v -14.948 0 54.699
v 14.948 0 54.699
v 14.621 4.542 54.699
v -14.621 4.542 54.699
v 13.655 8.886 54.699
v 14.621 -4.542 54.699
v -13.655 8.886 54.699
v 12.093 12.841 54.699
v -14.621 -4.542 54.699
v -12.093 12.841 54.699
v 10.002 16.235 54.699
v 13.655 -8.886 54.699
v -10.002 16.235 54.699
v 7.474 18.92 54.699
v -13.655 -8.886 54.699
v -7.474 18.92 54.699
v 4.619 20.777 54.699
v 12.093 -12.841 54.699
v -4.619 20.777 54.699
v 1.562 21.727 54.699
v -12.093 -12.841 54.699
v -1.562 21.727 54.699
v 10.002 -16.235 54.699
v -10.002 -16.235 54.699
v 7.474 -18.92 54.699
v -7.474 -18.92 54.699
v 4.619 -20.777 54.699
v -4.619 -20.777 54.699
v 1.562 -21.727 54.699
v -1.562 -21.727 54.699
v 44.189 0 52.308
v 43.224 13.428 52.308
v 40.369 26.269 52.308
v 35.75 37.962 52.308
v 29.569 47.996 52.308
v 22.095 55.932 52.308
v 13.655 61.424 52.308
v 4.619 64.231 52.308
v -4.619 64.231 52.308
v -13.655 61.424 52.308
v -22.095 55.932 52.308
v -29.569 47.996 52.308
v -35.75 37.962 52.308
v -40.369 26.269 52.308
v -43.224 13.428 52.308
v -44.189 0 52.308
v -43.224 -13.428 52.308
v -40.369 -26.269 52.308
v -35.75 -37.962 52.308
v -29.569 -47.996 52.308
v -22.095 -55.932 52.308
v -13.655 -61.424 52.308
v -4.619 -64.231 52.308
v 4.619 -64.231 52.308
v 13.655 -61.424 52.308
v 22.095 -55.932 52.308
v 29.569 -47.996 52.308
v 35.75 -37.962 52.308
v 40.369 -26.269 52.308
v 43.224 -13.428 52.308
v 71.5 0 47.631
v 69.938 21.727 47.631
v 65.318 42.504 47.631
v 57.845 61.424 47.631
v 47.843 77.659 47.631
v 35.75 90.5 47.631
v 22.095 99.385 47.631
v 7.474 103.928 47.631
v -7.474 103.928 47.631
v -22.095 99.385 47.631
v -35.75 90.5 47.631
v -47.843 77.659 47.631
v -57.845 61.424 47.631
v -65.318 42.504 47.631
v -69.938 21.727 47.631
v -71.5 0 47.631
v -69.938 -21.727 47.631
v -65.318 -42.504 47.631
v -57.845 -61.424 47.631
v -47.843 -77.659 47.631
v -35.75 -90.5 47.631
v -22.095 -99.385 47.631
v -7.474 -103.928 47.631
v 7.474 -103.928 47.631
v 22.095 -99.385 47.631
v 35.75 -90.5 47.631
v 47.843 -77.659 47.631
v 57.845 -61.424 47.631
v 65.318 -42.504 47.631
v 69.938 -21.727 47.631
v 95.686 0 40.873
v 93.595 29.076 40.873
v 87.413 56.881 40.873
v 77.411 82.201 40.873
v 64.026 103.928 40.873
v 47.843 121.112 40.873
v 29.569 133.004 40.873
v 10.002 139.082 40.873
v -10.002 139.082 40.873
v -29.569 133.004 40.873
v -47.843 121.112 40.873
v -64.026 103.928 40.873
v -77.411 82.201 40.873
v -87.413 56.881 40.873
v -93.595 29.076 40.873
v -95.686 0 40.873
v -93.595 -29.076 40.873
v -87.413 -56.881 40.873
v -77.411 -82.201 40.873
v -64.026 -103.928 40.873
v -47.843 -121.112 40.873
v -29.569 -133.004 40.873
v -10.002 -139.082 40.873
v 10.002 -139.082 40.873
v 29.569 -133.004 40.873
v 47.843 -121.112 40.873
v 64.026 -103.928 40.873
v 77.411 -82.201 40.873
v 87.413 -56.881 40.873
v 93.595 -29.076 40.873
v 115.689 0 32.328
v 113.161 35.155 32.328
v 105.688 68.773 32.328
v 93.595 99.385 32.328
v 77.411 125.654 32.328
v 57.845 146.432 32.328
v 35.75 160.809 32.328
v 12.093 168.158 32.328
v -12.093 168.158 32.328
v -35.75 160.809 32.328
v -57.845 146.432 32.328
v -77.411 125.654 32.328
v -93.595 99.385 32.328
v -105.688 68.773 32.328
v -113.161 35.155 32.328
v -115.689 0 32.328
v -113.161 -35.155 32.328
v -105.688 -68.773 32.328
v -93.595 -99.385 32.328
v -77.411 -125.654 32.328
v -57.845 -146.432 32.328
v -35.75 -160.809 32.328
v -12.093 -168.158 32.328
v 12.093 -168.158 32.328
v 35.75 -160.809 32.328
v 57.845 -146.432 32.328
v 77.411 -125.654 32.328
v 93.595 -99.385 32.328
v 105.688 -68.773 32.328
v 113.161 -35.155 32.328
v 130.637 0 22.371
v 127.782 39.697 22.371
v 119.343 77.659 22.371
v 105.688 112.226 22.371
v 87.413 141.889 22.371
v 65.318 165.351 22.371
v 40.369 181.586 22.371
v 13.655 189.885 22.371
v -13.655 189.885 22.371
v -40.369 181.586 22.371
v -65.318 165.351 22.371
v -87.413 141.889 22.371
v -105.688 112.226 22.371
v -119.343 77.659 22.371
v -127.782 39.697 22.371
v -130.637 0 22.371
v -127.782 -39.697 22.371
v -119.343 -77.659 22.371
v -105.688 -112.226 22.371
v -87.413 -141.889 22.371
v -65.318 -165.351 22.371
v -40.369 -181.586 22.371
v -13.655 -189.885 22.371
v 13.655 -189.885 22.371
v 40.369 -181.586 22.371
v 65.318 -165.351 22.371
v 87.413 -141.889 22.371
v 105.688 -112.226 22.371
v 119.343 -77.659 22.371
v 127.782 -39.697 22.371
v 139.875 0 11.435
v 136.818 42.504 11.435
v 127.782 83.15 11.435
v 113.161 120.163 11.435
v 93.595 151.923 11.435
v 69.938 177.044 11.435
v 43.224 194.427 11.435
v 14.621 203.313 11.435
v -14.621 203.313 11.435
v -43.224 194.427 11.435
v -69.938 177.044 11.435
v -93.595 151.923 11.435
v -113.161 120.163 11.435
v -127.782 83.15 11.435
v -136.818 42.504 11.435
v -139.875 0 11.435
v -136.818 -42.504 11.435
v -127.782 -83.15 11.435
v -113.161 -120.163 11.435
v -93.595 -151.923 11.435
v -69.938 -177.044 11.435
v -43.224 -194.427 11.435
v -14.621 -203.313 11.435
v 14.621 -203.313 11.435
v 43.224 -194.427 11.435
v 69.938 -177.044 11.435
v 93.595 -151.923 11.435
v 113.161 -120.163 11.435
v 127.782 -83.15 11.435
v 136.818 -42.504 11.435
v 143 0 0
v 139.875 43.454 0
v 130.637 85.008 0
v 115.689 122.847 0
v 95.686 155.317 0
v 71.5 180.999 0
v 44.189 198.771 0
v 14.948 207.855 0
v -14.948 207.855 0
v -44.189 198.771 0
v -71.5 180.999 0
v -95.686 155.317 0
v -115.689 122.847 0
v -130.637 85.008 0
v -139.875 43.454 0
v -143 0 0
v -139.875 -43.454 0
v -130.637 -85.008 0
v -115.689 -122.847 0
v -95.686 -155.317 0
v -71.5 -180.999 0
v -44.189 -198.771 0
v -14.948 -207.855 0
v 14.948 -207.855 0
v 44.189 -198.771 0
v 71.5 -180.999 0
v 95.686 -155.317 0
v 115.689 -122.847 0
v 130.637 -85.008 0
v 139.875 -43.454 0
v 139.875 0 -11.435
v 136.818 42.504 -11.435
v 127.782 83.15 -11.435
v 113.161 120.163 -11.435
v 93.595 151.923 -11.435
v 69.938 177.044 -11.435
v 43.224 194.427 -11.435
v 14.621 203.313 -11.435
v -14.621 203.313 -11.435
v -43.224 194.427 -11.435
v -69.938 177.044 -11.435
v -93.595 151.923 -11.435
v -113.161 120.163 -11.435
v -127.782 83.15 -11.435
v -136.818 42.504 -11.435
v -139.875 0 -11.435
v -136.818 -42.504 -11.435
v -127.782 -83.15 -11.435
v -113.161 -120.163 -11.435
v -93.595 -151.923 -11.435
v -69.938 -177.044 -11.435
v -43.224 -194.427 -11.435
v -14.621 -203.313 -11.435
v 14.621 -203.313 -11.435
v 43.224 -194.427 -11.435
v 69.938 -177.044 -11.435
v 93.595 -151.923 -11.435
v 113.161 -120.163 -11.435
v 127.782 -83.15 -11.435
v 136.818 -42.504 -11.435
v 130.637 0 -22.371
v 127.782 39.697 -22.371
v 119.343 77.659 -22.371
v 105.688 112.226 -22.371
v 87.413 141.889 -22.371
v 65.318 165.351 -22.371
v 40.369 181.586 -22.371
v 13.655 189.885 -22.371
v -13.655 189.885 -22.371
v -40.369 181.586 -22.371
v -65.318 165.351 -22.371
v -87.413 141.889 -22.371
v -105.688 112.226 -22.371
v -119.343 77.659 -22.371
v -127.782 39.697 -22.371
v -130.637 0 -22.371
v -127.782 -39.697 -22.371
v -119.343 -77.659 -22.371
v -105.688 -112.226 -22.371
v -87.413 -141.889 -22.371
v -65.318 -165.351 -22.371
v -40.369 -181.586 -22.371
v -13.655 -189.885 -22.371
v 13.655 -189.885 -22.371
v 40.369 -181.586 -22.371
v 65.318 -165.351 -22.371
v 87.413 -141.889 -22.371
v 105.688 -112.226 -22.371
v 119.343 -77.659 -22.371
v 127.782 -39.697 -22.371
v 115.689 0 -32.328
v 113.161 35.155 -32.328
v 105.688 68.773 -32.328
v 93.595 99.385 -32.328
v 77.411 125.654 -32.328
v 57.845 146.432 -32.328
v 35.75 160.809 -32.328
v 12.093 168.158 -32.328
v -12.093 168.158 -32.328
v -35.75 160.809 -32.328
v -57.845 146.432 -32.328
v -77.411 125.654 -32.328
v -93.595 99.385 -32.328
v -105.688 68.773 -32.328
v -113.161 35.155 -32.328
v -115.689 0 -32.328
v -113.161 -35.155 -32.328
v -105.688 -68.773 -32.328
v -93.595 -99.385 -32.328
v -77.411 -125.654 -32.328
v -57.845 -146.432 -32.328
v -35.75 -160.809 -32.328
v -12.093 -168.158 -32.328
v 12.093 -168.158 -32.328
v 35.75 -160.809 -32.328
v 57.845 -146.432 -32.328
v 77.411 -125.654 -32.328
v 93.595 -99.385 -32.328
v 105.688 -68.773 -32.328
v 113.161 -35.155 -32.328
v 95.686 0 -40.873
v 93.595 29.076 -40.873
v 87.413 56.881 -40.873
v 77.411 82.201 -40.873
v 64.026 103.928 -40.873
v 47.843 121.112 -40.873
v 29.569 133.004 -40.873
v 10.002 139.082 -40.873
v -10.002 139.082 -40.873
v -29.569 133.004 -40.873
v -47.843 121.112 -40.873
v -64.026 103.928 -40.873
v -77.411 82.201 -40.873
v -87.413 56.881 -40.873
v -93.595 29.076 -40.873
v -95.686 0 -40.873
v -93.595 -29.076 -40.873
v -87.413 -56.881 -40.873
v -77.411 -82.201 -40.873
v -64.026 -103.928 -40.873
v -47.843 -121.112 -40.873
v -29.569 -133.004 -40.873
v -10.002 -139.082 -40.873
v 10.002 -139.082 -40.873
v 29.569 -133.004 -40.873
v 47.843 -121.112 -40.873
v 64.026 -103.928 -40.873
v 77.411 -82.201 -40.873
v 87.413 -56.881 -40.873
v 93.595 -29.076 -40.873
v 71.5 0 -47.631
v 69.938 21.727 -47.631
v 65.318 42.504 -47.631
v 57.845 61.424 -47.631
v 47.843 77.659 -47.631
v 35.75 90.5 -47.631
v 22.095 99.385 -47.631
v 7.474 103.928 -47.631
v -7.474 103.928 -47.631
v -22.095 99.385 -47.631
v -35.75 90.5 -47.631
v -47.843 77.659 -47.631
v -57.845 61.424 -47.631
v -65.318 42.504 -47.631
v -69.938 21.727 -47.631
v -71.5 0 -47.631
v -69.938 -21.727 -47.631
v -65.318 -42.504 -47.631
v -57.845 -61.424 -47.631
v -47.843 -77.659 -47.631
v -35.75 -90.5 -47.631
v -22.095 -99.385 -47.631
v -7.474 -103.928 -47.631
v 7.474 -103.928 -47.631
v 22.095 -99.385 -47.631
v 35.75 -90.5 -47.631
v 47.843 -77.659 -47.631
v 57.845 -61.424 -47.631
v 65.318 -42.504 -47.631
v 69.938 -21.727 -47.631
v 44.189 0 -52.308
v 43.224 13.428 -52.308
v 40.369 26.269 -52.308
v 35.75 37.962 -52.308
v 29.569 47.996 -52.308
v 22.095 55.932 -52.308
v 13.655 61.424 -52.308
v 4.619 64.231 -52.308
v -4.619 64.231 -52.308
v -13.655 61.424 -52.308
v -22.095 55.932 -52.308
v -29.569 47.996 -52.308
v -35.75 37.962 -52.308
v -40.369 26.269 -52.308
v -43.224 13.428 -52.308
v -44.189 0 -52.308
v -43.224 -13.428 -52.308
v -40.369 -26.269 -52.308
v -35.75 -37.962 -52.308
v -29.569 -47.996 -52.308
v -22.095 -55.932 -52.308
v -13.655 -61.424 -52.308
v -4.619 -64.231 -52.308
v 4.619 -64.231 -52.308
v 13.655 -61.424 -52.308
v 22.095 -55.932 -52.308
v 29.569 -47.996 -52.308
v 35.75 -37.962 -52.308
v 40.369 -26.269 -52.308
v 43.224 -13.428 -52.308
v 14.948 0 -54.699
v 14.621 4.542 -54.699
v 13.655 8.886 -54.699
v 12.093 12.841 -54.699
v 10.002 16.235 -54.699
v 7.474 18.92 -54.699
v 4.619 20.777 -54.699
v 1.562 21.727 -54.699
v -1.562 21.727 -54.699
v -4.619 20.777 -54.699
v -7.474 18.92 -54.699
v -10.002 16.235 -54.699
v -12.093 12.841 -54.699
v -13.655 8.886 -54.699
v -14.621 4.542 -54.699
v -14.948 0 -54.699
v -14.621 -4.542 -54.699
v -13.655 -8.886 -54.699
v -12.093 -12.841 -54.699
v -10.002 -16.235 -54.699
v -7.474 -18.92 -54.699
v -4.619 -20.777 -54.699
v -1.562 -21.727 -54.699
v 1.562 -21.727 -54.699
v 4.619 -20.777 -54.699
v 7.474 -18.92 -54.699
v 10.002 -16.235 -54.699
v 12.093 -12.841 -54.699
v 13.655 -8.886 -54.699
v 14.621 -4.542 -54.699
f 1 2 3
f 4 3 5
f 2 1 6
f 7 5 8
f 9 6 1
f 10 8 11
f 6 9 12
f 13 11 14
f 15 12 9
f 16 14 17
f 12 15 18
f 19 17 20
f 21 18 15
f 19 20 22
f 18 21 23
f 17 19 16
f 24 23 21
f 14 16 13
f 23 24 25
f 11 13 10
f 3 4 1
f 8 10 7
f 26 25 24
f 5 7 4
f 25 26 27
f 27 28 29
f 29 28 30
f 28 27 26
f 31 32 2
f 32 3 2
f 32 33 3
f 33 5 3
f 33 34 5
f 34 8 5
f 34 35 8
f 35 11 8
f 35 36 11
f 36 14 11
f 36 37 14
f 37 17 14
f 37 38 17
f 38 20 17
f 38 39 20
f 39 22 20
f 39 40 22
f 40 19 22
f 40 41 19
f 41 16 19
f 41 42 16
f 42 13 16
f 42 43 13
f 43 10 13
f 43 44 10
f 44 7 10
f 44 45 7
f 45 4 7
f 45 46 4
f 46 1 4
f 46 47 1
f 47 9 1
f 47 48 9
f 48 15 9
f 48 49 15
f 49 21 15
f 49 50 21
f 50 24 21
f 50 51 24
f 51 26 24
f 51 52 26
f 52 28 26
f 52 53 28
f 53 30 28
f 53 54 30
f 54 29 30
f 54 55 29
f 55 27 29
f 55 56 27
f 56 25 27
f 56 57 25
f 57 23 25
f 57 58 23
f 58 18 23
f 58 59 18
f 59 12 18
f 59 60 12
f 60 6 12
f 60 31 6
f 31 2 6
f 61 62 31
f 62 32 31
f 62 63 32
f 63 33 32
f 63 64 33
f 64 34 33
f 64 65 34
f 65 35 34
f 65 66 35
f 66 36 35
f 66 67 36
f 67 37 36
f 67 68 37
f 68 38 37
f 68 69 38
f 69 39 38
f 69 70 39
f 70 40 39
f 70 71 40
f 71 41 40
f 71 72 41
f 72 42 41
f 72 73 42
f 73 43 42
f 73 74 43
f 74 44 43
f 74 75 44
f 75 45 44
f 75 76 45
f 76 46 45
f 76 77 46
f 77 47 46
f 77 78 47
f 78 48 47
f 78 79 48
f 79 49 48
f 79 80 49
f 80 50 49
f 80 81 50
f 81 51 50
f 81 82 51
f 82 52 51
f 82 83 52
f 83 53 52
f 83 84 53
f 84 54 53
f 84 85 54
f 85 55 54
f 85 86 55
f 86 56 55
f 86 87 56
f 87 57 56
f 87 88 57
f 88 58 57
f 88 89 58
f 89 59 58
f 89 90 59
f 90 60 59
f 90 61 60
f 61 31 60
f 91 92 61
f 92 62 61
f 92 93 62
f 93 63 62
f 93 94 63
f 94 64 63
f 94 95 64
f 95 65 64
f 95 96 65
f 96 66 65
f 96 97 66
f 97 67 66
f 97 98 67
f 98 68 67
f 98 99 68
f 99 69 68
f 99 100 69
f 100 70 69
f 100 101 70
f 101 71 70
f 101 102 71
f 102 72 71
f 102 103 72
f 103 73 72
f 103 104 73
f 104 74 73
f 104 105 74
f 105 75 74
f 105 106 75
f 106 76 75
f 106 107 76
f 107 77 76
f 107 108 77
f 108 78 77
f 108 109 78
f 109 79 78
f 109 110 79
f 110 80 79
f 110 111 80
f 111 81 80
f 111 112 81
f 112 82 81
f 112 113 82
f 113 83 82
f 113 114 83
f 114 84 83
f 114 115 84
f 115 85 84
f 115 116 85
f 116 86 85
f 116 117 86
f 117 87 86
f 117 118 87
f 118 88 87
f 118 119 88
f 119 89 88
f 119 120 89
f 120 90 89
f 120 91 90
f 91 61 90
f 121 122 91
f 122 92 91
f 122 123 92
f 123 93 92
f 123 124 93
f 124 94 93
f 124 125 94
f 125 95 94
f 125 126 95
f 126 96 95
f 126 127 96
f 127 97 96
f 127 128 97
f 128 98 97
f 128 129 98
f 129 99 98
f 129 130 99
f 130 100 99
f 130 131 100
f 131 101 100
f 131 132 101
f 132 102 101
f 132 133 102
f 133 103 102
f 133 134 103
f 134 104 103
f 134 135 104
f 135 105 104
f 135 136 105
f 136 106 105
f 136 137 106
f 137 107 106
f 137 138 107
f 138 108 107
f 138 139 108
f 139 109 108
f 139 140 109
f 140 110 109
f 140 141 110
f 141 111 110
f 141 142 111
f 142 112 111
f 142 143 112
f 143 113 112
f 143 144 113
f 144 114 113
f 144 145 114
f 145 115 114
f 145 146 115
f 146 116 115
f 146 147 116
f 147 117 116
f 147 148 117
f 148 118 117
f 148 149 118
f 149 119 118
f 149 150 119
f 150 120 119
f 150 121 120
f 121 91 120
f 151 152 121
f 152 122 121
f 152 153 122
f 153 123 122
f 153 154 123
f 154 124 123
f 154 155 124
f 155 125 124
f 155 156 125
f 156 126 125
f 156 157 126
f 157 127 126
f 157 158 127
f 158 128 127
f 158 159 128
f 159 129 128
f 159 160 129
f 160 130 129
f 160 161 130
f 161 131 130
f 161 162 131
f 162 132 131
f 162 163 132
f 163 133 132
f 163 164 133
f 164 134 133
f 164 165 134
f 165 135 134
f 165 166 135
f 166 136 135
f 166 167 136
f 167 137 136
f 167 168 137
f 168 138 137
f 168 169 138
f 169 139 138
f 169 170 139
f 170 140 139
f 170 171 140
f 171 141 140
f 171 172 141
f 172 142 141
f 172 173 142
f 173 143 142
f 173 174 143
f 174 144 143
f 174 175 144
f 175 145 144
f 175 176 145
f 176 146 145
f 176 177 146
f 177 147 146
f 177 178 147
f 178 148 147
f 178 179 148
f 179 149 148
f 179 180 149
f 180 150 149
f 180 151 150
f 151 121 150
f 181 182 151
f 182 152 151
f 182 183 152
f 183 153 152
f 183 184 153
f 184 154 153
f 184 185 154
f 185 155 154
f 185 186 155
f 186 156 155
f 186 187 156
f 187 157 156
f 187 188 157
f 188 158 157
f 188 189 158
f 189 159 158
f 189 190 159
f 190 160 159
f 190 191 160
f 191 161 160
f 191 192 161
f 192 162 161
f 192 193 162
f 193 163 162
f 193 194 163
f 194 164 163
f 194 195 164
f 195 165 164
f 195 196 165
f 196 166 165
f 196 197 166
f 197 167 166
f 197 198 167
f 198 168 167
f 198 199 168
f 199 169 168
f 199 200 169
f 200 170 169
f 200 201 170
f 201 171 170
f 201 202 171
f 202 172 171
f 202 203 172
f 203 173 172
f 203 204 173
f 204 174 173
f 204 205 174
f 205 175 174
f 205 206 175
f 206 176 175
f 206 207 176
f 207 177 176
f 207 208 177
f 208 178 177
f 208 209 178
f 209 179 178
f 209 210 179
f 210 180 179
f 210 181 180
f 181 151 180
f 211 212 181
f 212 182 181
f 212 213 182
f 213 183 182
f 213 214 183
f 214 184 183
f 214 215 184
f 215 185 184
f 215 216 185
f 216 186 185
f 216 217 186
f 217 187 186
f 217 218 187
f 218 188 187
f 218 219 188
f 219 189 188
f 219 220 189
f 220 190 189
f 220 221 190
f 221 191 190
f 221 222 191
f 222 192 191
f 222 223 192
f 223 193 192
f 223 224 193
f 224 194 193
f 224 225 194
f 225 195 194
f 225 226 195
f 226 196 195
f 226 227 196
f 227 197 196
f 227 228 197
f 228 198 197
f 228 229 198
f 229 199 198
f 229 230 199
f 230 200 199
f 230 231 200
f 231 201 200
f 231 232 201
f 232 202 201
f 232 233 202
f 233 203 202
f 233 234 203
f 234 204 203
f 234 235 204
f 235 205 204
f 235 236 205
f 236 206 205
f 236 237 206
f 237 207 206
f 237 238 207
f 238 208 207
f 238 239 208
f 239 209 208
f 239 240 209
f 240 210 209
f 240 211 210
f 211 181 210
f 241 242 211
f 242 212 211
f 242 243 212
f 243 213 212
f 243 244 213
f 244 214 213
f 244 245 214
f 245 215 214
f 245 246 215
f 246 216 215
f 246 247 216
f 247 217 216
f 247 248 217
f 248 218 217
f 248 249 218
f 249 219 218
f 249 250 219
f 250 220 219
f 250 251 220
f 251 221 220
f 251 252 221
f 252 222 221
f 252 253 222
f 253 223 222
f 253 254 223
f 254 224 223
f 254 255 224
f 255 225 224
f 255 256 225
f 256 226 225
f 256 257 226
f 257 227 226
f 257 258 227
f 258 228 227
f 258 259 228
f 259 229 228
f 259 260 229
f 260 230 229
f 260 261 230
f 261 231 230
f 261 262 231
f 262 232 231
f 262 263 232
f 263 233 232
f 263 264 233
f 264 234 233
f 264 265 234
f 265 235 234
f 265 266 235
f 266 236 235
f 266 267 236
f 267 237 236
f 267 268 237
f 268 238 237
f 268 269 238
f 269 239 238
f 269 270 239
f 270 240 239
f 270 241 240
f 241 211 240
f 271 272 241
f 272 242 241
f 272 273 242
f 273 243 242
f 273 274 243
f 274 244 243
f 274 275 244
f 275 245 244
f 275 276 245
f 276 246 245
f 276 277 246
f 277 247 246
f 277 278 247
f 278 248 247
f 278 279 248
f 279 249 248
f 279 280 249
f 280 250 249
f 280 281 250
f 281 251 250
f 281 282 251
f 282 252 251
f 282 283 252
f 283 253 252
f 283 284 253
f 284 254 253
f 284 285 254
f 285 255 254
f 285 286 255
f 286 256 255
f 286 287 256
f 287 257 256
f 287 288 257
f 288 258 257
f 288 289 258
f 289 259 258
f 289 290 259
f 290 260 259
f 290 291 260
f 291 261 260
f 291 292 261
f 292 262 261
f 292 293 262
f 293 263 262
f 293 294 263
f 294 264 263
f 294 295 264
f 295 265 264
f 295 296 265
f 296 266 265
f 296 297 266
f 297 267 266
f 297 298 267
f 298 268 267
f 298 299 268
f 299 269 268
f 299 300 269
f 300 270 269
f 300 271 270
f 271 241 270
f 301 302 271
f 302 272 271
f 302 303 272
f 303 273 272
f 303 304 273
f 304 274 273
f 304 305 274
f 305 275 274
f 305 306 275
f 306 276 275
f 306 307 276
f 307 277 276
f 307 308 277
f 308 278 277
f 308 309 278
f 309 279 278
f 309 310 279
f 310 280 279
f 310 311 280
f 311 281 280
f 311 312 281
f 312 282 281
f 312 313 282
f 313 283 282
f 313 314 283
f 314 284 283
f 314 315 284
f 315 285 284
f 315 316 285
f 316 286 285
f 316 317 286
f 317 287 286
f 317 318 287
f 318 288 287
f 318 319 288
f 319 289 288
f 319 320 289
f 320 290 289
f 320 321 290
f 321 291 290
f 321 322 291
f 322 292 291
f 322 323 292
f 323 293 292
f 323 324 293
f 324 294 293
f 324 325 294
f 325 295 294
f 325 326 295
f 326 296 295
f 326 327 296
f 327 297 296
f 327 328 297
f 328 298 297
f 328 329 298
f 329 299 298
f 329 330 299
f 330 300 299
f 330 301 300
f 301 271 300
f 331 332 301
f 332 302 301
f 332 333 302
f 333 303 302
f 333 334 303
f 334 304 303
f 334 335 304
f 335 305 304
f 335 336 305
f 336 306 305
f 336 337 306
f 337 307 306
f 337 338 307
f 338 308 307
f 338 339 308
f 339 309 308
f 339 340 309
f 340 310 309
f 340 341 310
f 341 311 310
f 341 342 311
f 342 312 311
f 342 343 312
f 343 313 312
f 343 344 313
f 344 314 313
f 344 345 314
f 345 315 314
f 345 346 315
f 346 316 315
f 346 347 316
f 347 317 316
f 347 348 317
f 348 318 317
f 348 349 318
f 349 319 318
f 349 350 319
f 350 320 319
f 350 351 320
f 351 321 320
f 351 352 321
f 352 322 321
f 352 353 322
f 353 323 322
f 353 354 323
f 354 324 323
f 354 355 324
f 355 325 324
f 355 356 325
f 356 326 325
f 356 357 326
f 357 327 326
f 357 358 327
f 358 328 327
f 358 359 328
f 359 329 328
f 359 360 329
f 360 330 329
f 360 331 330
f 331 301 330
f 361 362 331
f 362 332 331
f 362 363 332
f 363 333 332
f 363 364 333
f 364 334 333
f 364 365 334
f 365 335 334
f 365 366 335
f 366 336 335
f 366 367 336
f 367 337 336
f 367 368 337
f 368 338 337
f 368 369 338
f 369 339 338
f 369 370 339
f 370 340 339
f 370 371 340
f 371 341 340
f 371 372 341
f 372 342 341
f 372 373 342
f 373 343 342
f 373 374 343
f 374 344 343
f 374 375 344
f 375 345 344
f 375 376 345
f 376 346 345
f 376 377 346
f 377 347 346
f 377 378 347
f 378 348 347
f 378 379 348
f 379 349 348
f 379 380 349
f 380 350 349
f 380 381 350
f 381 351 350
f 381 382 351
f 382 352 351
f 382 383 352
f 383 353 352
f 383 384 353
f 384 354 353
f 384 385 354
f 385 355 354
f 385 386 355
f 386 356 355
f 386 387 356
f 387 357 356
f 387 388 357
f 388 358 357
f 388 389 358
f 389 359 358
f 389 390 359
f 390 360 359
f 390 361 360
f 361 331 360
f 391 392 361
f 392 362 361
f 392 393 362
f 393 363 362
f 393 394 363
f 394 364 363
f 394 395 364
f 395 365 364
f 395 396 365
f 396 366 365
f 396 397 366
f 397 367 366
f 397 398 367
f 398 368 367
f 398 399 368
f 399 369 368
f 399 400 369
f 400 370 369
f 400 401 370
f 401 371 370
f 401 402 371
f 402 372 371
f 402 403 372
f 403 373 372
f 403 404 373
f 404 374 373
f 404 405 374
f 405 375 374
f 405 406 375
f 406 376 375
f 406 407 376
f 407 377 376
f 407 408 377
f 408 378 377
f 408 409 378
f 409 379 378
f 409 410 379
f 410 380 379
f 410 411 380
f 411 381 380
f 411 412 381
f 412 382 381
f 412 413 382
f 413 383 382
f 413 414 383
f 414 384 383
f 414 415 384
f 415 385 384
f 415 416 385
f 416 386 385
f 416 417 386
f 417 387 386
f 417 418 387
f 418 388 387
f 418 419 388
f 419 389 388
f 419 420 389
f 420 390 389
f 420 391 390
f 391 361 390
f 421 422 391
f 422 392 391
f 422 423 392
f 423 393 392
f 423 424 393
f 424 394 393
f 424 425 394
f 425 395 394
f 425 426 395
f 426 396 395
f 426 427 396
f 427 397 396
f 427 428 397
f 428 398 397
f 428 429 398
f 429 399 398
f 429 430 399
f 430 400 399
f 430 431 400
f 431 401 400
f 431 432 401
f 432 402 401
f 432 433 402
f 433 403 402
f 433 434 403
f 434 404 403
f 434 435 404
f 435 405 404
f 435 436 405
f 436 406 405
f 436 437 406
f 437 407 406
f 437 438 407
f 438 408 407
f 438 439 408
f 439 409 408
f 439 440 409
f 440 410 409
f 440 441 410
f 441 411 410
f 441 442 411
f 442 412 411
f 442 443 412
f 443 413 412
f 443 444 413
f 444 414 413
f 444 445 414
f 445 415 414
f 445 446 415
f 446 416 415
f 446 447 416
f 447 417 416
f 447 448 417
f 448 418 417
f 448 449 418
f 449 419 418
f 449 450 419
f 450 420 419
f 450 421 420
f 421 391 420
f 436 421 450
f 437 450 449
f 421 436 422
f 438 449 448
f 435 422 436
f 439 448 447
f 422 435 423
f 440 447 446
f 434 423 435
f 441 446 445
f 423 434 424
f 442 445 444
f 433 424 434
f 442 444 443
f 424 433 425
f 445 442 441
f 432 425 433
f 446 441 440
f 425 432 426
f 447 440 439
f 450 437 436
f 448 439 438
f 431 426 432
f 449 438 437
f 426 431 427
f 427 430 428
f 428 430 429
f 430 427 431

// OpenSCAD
// Generated by SolidPython 1.0.1 on 2020-07-29 00:46:51


scale(v = [13, 19, 5]) {
	sphere(r = 11);
}
/***********************************************
*********      SolidPython code:      **********
************************************************
 
# import packages: SolidPython
from solid import *
from solid.utils import *
from itertools import chain, combinations, permutations


class Resize:

    def __init__(self, scad_file):
        self.scad_file = scad_file
        #self.scad_file = import_scad(scad_file)
        # cone/cylinder param:
        self.r1 = 0
        self.r2 = 0
        self.h = 0
        # rectangular prism param:
        self.w = 0
        self.l = 0
        # ellipse param:
        self.r = 0

    # import OpenScad code (file name corresponds to shape)


    # classify shape + parameters
    def assign(self, param1, param2, param3):
        if self.scad_file == 'cone.scad':
            self.r1 = param1
            self.r2 = param2
            self.h = param3
        elif self.scad_file == 'cylinder.scad':
            self.r1 = param1
            self.r2 = param2
            self.h = param3
        elif self.scad_file == 'rectangularPrism.scad':
            self.h = param1
            self.l = param2
            self.w = param3
        else:
            self.r = param1
            self.h = param2

    # resize parameters
    def iterate(self):
        x = range(3, 20, 2)
        i = 1
        if self.scad_file == 'cone.scad':
            tempList = list(permutations(x, 2))
            for temp in tempList:
                param1 = temp[0]
                param2 = temp[1]
                filepath = 'produced_scad_files/' + 'cone' + str(param1) + '_' + str(param2) + '_' + '.scad'
                scad_render_to_file(cylinder(h=param1, r1=param2, r2=0), filepath)

        elif self.scad_file == 'cylinder.scad':
            tempList = list(permutations(x, 3))
            for temp in tempList:
                param1 = temp[0]
                param2 = temp[1]
                filepath = 'produced_scad_files/' + 'cylinder' + str(param1) + '_' + str(param2) + '_' + '.scad'
                scad_render_to_file(cylinder(h=param1, r1=param2, r2=param2), filepath)

        elif self.scad_file == 'rectangularPrism.scad':
            tempList = list(permutations(x, 3))
            for temp in tempList:
                param1 = temp[0]
                param2 = temp[1]
                param3 = temp[2]
                filepath = 'produced_scad_files/' + 'rectangularPrism' + str(param1) + '_' + str(param2) + '_' + str(
                    param3) + '.scad'
                scad_render_to_file(cube(size=(param1, param2, param3)), filepath)

        elif self.scad_file == 'ellipse.scad':
            tempList = list(permutations(x, 4))
            for temp in tempList:
                param1 = temp[0]
                param2 = temp[1]
                param3 = temp[2]
                param4 = temp[3]
                filepath = 'produced_scad_files/' + 'ellipse' + str(param1) + '_' + str(param2) + '_' + str(param3) + '_' + str(param4) + '.scad'
                scad_render_to_file(scale([param1, param2, param3])(sphere(r=param4)), filepath)

    def render_to_scadfile(self):
        scad_render_to_file(scad, 'example.scad') 
 
************************************************/
